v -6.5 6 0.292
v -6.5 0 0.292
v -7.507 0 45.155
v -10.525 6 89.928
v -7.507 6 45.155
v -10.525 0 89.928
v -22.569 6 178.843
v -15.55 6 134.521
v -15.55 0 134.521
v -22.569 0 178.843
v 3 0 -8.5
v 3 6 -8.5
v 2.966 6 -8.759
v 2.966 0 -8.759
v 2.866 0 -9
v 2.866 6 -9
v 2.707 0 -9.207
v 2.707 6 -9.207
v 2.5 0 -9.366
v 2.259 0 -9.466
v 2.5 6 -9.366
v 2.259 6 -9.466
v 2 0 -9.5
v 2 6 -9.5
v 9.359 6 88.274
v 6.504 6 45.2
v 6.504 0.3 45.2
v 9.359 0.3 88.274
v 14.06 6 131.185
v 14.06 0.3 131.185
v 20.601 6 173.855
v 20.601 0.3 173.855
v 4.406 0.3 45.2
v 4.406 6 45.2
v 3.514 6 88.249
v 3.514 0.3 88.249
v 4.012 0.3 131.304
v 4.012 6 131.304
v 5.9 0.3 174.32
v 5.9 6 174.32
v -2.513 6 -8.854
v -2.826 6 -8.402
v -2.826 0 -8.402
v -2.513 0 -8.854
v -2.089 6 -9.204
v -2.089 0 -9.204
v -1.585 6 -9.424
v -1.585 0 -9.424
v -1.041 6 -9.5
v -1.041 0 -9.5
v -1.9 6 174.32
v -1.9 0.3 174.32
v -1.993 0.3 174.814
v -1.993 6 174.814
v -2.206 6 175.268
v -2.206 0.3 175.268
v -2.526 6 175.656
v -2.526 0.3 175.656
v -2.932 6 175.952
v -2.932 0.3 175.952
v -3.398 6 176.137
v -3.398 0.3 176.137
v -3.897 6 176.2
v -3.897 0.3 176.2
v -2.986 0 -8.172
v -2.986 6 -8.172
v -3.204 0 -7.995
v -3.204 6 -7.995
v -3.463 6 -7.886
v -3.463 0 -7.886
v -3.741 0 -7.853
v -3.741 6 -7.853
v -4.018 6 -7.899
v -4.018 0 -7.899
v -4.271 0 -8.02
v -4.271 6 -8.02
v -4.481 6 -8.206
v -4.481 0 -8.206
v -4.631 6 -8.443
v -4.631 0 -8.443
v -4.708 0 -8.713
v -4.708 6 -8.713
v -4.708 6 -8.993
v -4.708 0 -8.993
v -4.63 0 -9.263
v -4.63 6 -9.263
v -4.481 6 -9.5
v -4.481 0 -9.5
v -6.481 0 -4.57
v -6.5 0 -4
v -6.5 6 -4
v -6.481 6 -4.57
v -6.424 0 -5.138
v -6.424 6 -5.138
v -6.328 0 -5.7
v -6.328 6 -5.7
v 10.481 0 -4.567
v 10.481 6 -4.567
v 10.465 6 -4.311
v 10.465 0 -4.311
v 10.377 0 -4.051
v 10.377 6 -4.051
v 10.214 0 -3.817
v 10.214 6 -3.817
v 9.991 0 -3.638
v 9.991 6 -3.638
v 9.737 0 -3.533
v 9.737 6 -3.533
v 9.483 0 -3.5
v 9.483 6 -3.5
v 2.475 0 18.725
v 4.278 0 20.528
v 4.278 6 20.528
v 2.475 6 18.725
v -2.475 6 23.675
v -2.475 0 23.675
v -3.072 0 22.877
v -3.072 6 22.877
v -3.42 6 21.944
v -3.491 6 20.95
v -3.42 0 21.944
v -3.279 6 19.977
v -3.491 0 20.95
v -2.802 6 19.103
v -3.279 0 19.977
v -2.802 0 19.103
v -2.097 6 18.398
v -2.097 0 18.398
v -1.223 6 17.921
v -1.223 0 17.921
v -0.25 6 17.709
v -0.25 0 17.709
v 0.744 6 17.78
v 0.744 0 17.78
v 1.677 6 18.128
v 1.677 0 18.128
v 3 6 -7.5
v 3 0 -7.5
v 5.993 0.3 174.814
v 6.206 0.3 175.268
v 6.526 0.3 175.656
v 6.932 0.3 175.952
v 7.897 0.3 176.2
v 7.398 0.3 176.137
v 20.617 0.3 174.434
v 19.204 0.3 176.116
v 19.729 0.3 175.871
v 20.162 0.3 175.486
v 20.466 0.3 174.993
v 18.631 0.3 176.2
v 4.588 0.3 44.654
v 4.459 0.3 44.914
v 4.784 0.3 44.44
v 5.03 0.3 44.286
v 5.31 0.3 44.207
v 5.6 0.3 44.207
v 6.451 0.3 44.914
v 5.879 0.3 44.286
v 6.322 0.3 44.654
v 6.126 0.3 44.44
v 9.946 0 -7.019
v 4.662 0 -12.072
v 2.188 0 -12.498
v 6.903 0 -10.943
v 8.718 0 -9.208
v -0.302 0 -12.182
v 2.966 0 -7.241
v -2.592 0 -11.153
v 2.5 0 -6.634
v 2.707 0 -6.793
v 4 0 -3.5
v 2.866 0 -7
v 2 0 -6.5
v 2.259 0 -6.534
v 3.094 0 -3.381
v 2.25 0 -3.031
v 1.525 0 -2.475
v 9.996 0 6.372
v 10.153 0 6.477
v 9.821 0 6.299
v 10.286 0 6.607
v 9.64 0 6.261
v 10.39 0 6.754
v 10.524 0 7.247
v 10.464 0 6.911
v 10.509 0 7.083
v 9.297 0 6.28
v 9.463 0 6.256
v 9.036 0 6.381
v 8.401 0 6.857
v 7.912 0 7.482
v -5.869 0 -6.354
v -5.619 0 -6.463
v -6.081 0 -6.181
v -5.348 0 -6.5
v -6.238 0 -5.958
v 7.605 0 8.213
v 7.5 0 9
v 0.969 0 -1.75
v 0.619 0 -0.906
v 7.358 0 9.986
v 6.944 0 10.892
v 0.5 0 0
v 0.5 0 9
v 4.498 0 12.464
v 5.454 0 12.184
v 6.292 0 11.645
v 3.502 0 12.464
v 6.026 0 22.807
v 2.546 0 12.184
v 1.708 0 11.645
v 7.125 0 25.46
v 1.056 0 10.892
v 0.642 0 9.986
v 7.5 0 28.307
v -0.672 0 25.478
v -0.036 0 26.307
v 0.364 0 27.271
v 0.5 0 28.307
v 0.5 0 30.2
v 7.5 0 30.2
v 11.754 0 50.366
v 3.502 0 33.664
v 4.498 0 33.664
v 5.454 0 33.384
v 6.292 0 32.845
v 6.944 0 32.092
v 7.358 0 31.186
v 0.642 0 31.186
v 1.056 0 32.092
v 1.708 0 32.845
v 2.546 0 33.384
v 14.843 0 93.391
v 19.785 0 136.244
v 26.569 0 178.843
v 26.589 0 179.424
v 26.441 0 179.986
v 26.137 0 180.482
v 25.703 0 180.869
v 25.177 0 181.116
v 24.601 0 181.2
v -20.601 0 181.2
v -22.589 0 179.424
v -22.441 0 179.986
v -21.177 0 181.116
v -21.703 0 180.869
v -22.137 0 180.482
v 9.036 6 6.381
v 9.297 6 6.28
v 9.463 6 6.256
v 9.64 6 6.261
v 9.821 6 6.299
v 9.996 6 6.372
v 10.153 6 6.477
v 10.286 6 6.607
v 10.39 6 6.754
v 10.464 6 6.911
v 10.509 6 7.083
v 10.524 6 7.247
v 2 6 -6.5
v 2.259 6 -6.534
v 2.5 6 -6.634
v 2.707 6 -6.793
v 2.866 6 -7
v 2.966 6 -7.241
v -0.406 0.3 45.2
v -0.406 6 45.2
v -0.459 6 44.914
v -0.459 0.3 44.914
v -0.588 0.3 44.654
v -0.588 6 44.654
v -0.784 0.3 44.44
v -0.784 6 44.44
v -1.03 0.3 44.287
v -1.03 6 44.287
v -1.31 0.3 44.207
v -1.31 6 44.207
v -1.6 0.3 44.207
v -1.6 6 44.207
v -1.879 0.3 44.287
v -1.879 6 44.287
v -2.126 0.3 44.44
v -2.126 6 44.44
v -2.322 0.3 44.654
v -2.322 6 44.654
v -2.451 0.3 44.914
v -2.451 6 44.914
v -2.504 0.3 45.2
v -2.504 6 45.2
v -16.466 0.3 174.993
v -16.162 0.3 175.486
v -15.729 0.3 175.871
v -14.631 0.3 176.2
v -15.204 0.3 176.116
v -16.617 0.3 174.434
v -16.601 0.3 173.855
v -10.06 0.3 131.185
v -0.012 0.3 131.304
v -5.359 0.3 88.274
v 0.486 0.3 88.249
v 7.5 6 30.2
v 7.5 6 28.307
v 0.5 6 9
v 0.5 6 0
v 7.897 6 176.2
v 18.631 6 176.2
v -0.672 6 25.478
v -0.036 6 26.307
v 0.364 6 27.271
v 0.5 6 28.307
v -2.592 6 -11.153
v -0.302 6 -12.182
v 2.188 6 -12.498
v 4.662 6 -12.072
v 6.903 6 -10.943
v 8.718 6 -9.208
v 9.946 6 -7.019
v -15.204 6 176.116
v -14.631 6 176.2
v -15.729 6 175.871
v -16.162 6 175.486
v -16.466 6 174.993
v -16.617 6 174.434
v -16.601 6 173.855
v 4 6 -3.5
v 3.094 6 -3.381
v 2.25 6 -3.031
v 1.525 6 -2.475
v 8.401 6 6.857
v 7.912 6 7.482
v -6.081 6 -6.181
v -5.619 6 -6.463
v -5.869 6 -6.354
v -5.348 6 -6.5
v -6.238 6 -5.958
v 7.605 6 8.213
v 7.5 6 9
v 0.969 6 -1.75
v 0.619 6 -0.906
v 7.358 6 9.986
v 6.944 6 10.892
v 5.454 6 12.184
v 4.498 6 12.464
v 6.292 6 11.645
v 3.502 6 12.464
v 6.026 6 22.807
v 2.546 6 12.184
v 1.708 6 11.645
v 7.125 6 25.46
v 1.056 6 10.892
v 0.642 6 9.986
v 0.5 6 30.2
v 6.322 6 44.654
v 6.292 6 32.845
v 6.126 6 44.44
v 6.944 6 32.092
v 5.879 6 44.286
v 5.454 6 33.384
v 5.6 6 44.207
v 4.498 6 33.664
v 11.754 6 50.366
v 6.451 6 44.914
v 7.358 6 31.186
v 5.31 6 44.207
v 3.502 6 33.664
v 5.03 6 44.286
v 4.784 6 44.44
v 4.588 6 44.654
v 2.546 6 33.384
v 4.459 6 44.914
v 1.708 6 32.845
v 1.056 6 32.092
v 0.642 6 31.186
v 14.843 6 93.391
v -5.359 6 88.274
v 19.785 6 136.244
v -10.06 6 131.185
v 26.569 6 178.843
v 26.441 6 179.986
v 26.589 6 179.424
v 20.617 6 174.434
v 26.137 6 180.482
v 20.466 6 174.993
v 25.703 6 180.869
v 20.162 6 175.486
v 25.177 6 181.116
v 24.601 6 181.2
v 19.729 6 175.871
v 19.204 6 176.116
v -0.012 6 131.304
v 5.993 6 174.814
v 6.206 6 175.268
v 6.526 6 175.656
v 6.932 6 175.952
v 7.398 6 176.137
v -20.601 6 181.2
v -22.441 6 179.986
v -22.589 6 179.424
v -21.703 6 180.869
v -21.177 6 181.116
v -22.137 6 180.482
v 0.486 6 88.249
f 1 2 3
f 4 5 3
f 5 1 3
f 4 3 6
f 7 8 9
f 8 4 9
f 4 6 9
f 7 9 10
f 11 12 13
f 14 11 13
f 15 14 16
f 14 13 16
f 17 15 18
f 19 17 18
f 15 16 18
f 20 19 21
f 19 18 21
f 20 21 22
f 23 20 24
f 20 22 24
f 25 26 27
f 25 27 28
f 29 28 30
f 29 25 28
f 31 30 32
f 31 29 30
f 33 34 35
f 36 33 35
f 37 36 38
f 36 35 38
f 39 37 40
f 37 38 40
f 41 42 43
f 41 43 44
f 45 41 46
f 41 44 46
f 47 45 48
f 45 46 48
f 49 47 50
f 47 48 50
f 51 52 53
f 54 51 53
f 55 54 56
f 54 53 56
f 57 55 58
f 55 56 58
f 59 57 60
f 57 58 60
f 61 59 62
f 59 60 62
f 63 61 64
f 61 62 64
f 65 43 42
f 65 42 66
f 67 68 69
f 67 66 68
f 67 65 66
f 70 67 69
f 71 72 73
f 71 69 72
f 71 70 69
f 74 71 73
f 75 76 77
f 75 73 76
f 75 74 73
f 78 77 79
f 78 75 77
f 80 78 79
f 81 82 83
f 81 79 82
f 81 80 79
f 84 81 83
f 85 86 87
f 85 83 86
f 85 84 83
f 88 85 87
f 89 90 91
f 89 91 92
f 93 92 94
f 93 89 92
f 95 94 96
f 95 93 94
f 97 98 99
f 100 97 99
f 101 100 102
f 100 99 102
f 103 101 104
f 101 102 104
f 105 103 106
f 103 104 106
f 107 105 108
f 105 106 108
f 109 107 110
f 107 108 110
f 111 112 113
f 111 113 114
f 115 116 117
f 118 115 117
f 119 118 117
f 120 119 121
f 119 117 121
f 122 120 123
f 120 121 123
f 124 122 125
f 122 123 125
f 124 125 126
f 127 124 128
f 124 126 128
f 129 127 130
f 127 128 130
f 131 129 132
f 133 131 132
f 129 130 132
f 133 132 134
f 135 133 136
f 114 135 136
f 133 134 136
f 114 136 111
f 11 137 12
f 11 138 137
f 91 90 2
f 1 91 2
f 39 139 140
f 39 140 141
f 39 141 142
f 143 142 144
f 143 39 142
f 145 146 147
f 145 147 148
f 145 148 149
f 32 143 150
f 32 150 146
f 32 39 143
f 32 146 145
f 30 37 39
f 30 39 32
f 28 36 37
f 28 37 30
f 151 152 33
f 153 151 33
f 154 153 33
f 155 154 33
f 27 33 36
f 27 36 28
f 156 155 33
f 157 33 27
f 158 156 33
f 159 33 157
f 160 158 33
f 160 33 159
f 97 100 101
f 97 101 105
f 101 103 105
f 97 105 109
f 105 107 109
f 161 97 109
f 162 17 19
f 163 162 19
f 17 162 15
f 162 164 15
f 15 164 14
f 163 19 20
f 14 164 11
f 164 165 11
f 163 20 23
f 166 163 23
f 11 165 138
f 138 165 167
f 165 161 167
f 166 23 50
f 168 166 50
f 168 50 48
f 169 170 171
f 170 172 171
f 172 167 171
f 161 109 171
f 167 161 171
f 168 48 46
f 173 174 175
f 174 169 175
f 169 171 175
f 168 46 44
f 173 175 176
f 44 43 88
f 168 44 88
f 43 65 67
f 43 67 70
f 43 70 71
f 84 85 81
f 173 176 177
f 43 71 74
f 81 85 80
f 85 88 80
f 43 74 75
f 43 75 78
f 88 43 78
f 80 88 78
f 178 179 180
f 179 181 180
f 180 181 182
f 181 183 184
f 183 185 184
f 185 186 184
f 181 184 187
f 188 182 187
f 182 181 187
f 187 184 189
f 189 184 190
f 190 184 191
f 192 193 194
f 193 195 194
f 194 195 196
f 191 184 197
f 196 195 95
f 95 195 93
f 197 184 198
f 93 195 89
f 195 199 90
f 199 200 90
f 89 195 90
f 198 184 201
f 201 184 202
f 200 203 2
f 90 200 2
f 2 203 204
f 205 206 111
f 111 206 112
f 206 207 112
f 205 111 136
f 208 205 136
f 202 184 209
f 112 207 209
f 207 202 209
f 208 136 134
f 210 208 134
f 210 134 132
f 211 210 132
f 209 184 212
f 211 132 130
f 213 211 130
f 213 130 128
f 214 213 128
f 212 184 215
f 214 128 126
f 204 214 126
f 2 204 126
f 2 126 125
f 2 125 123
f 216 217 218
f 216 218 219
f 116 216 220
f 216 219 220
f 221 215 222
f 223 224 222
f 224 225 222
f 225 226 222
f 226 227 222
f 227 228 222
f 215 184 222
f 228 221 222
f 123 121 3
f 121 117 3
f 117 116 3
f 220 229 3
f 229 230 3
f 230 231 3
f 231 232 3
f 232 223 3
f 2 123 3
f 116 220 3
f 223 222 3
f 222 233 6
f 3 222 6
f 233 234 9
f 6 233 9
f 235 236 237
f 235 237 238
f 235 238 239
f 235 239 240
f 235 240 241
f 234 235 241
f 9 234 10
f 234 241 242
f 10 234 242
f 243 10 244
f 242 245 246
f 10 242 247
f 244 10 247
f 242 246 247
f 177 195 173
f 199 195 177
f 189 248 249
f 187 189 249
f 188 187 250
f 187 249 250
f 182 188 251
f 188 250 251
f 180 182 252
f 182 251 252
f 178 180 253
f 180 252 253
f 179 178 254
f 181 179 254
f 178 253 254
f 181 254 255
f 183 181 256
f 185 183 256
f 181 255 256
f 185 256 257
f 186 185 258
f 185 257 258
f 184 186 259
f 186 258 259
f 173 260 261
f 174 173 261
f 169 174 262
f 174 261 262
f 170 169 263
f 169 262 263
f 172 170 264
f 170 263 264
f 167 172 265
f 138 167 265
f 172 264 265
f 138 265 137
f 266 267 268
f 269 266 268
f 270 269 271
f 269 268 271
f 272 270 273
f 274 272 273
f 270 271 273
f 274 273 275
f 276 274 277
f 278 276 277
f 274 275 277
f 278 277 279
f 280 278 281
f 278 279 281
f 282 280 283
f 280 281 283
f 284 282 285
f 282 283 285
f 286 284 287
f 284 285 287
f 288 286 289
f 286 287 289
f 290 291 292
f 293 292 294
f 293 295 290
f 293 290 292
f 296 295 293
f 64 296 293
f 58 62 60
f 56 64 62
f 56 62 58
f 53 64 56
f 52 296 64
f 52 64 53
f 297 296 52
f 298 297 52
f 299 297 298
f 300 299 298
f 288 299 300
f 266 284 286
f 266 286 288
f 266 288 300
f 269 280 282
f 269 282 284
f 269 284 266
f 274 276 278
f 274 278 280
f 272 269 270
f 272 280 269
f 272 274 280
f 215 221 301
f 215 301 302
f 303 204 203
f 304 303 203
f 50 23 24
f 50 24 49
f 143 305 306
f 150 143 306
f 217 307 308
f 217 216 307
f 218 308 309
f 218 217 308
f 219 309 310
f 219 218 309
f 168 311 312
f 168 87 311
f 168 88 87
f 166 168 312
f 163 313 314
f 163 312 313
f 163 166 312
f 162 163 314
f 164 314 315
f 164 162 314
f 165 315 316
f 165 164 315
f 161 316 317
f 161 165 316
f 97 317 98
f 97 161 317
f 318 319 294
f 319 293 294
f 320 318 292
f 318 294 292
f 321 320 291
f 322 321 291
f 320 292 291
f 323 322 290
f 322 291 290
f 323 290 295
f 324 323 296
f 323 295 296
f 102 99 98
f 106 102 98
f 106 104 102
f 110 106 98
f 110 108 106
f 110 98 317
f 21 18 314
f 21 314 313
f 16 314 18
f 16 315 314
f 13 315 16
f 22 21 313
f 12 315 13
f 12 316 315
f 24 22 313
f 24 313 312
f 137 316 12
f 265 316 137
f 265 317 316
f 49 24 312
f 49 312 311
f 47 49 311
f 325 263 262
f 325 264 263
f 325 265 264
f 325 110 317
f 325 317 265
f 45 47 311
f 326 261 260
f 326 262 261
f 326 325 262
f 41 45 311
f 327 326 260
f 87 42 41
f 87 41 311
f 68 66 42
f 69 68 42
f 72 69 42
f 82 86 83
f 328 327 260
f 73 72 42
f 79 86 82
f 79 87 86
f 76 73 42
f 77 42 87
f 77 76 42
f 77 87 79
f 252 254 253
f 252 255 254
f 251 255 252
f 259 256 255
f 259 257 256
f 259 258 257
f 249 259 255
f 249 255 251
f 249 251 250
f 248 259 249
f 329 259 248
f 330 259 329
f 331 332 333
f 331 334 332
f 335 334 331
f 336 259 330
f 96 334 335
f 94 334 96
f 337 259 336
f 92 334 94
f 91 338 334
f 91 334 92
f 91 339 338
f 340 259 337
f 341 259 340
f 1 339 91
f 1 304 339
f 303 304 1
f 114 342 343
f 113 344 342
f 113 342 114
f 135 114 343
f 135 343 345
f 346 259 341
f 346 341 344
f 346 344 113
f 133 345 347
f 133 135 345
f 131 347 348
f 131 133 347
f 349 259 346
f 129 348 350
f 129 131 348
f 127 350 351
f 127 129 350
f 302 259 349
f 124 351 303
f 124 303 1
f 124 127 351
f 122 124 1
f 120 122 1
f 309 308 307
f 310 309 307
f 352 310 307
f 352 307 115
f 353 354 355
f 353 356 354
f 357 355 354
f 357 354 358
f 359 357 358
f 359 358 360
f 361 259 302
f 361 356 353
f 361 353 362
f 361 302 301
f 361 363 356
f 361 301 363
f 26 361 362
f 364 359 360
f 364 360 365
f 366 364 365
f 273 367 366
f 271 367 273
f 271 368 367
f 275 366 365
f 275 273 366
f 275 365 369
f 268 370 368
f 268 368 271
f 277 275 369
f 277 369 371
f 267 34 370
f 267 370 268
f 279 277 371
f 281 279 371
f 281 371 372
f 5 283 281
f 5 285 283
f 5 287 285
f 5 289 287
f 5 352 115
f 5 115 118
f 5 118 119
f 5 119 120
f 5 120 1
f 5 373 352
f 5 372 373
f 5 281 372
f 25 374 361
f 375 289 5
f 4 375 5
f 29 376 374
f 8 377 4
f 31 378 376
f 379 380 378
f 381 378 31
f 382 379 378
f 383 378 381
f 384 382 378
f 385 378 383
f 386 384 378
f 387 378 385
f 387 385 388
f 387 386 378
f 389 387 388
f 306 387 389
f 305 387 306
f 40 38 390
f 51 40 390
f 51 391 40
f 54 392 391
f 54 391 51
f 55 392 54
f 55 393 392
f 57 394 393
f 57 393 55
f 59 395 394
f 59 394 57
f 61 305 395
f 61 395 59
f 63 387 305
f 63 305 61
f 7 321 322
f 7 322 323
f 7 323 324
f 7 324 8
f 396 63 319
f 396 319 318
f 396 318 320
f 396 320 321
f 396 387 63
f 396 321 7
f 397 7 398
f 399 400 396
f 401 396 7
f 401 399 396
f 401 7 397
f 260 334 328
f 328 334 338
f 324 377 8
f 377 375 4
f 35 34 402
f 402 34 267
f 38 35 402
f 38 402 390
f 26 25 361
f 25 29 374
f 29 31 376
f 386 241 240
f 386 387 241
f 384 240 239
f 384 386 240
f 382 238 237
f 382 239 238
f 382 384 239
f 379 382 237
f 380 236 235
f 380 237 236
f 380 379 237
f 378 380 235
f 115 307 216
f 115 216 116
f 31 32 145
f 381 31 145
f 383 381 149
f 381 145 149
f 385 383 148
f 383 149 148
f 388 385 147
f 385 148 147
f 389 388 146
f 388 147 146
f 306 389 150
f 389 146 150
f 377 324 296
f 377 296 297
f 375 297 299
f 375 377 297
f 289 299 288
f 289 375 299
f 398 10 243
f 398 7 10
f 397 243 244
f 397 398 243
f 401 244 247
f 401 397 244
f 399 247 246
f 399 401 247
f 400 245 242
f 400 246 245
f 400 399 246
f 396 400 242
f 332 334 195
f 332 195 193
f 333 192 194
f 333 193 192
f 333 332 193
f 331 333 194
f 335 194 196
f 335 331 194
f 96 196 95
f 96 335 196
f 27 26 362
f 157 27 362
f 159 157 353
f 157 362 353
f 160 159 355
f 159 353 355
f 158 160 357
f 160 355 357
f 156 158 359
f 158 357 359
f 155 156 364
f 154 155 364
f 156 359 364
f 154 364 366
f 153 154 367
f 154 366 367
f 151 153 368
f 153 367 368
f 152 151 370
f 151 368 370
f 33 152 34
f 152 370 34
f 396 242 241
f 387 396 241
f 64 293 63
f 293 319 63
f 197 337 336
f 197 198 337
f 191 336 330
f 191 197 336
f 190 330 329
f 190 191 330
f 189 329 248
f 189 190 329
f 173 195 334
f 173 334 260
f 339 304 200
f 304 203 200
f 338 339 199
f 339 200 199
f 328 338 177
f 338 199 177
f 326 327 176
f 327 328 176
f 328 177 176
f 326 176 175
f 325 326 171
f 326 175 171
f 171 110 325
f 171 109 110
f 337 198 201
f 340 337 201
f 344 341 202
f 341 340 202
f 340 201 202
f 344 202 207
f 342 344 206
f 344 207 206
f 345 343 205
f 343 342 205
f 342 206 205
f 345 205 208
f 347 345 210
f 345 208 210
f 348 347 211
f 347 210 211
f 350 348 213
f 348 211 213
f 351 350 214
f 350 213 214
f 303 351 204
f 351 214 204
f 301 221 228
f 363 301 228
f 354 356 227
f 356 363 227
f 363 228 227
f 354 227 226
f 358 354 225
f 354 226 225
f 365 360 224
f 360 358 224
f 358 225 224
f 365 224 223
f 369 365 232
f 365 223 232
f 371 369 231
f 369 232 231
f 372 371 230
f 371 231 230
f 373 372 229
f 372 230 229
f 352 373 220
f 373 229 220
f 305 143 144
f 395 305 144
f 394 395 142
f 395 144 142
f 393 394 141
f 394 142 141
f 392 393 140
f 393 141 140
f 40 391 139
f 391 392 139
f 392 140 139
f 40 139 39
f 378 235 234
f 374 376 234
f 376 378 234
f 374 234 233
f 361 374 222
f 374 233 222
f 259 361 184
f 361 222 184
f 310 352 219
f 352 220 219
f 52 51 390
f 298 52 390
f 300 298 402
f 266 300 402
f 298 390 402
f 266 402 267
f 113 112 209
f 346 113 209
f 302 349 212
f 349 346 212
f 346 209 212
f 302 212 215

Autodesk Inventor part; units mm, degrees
ref_plane "YZ Plane" through (0, 0, 0) normal (1, 0, 0) x (0, 1, 0)
ref_plane "XZ Plane" through (0, 0, 0) normal (0, 1, 0) x (-1, 0, 0)
ref_plane "XY Plane" through (0, 0, 0) normal (0, 0, 1) x (1, 0, 0)
sketch "スケッチ1" plane through (0, 0, 0) normal (0, 1, 0) x (-1, 0, 0)
  circle A0 centre (0, 0) radius 3 construction
  circle A1 centre (0, 21.2) radius 3 construction
  line L0 (3, 24.2) -> (-3, 24.2) construction
  line L1 (-3, 24.2) -> (-3, -3) construction
  line L2 (-3, -3) -> (3, -3) construction
  line L3 (3, -3) -> (3, 24.2) construction
  circle A2 centre (0, 21.2) radius 3.5
  circle A3 centre (0, 0) radius 3.5 construction
  line L4 (0, 21.2) -> (-4, 25.2)
  line L5 (-4, 25.2) -> (-4, 30.2)
  circle A4 centre (-4, 30.2) radius 3.5
  line L6 (-0.5, 30.2) -> (-0.5, 26.6497)
  line L7 (-0.5, 26.6497) -> (2.4749, 23.6749)
  line L8 (-7.5, 30.2) -> (-7.5, 23.7503)
  line L9 (-7.5, 23.7503) -> (-2.4749, 18.7251)
  arc A5 (-0.5, 28.3066) -> (0.6716, 25.4782) centre (3.5, 28.3066) ccw
  arc A6 (-7.5, 28.3066) -> (-4.2782, 20.5284) centre (3.5, 28.3066) ccw
  circle A7 centre (-4, 9) radius 3.5
  line L10 (2.4749, 2.4749) -> (0.6716, 4.2782) construction
  arc A8 (-0.5, 7.1066) -> (0.6716, 4.2782) centre (3.5, 7.1066) ccw construction
  line L11 (-10.5, 0.2919) -> (-10.5, -4)
  line L12 (6.5, -4) -> (6.5, 0.2919)
  arc A9 (-10.5, -4) -> (6.5, -4) centre (-2, -4) ccw
  arc A10 (23, 181.2) -> (6.5, 0.2919) centre (1006.5, 0.2919) ccw
  arc A11 (-10.5, 0.2919) -> (-27, 181.2) centre (-1010.5, 0.2919) ccw
  line L13 (6.124, -6.5) -> (-3, -6.5)
  line L14 (-3, -6.5) -> (-3, -9.5)
  line L15 (-3, -9.5) -> (6.124, -9.5)
  line L16 (6.124, -9.5) -> (6.124, -6.5)
  arc A12 (4.4807, -9.5) -> (2.9559, -9.5) centre (3.7183, -8.8529) ccw
  arc A13 (1.0407, -9.5) -> (2.8258, -8.402) centre (1.0407, -7.5) ccw
  line L17 (23, 181.2) -> (-27, 181.2)
  circle A14 centre (-4, 0) radius 3.5
  line L18 (-0.5, 9) -> (-0.5, 0)
  line L19 (-7.5, 0) -> (-7.5, 9)
  line L20 (-4, 3.5) -> (-10.5, 3.5)
  line L21 (-10.5, 3.5) -> (-10.5, -3.5)
  line L22 (-10.5, -3.5) -> (-4, -3.5)
  line L23 (-4, -3.5) -> (-4, 3.5) construction
  arc A15 (-10.5, 6) -> (-7.5, 9) centre (-10.5, 9) ccw
  line L24 (-10.5, 6) -> (-10.6533, 6)
  point P0 (0, -3)
  point P1 (-3, -8)
  point P2 (-10.5, 0)
  point P3 (-7.5, 3.5)
  point P4 (-10.5163, 6)
  dimension "d7" = 7
  dimension "d0" = 6
  dimension "d1" = 6
  dimension "d2" = 21.2
  dimension "d3" = 27.2
  dimension "d4" = 3
  dimension "d5" = 6
  dimension "d6" = 7
  dimension "d8" = 5
  dimension "d9" = 135
  dimension "d10" = 4
  dimension "d11" = 4
  dimension "d12" = 21.2
  dimension "d14" = 6.5
  dimension "d15" = 4
  dimension "d17" = 3
  dimension "d18" = 1
  dimension "d19" = 2
  dimension "d20" = 1000
  dimension "d21" = 50
  dimension "d22" = 160
  dimension "d23" = 3
  dimension "d24" = 6.5
  dimension "d25" = 2.5
extrude "押し出し1" add sketch "スケッチ1" along normal blind 6 contours L9 L8 A6 | A7 A15 L24 A11 L17 A10 L12 A9 L13 L14 L15 L11 L22 A14 L18 | L15 A12 | L15 A13 A12
fillet "フィレット1" radius 1 5 edges at (10.5163, 3, 6) (3, 3, -9.5) (3, 3, -6.5) (-6.124, 3, -6.5) (10.5, 3, -3.5)
sketch "スケッチ2" plane through (0, 6, 0) normal (0, 1, 0) x (1, 0, 0)
  arc A0 (9.4833, 3.5) -> (10.4811, 4.5667) centre (9.4833, 4.5) ccw projected
  arc A1 (10.4811, 4.5667) -> (-4.4807, 9.5) centre (2, 4) ccw projected
  arc A2 (-4.4807, 9.5) -> (-2.8258, 8.402) centre (-3.7183, 8.8529) ccw projected
  arc A3 (-1.0407, 9.5) -> (-2.8258, 8.402) centre (-1.0407, 7.5) ccw projected
  line L0 (-1.0407, 9.5) -> (2, 9.5) projected
  arc A4 (3, 8.5) -> (2, 9.5) centre (2, 8.5) ccw projected
  line L1 (3, 8.5) -> (3, 7.5) projected
  arc A5 (2, 6.5) -> (3, 7.5) centre (2, 7.5) ccw projected
  line L2 (2, 6.5) -> (-5.3485, 6.5) projected
  arc A6 (-5.3485, 6.5) -> (-6.3283, 5.7) centre (-5.3485, 5.5) ccw projected
  arc A7 (-6.3283, 5.7) -> (-6.5, 4) centre (2, 4) ccw projected
  line L3 (-6.5, 4) -> (-6.5, -0.2919) projected
  arc A8 (-23, -181.2) -> (-6.5, -0.2919) centre (-1006.5, -0.2919) ccw projected
  line L4 (-23, -181.2) -> (27, -181.2) projected
  arc A9 (10.5242, -7.2472) -> (27, -181.2) centre (1010.5, -0.2919) ccw projected
  arc A10 (10.5242, -7.2472) -> (9.0363, -6.3813) centre (9.5242, -7.2542) ccw projected
  arc A11 (9.0363, -6.3813) -> (7.5, -9) centre (10.5, -9) ccw projected
  arc A12 (0.5, -9) -> (7.5, -9) centre (4, -9) ccw projected
  line L5 (0.5, -9) -> (0.5, 0) projected
  arc A13 (4, 3.5) -> (0.5, 0) centre (4, 0) ccw projected
  line L6 (4, 3.5) -> (9.4833, 3.5) projected
  arc A14 (7.5, -28.3066) -> (4.2782, -20.5284) centre (-3.5, -28.3066) ccw projected
  line L7 (7.5, -28.3066) -> (7.5, -30.2) projected
  arc A15 (0.5, -30.2) -> (7.5, -30.2) centre (4, -30.2) ccw projected
  line L8 (0.5, -30.2) -> (0.5, -28.3066) projected
  arc A16 (0.5, -28.3066) -> (-0.6716, -25.4782) centre (-3.5, -28.3066) ccw projected
  line L9 (-0.6716, -25.4782) -> (-2.4749, -23.6749) projected
  arc A17 (2.4749, -18.7251) -> (-2.4749, -23.6749) centre (0, -21.2) ccw projected
  line L10 (2.4749, -18.7251) -> (4.2782, -20.5284) projected
  arc A18 (-17.0146, -176.2) -> (-2.5039, -45.2) centre (-1006.5, -0.2919) ccw
  arc A19 (6.5039, -45.2) -> (21.0146, -176.2) centre (1010.5, -0.2919) ccw
  arc A20 (-23, -181.2) -> (-6.5, -0.2919) centre (-1006.5, -0.2919) ccw projected
  arc A21 (10.5242, -7.2472) -> (27, -181.2) centre (1010.5, -0.2919) ccw projected
  arc A22 (-0.406, -45.2) -> (-2.5039, -45.2) centre (-1.4549, -45.2469) ccw
  arc A23 (6.5039, -45.2) -> (4.406, -45.2) centre (5.4549, -45.2469) ccw
  arc A24 (-2.0146, -176.2) -> (-0.406, -45.2) centre (-1332.9861, -94.346) ccw
  arc A25 (4.406, -45.2) -> (6.0146, -176.2) centre (1336.9861, -94.346) ccw
  line L11 (-17.0146, -176.2) -> (-2.0146, -176.2)
  line L12 (6.0146, -176.2) -> (21.0146, -176.2)
  line L13 (0.5, -9) -> (0.5, 0) projected
  point P0 (0, 0)
  dimension "d38" = 15
  dimension "d39" = 5
  dimension "d40" = 5
  dimension "d41" = 1.05
  dimension "d42" = 1.05
  dimension "d43" = 15
  dimension "d44" = 15
  dimension "d46" = 5
extrude "押し出し3" cut sketch "スケッチ2" against normal blind 5.7 contours A18 A22 A24 L11 | A19 L12 A25 A23
fillet "フィレット2" radius 2 6 edges at (-17.0146, 3.15, 176.2) (-2.0146, 3.15, 176.2) (6.0146, 3.15, 176.2) (21.0146, 3.15, 176.2) (27, 3, 181.2) (-23, 3, 181.2)
equation "\"d7\" = d6"
equation "\"d12\" = d2"
properties part number "wing" material "ポリカーボネート、スモーク"
